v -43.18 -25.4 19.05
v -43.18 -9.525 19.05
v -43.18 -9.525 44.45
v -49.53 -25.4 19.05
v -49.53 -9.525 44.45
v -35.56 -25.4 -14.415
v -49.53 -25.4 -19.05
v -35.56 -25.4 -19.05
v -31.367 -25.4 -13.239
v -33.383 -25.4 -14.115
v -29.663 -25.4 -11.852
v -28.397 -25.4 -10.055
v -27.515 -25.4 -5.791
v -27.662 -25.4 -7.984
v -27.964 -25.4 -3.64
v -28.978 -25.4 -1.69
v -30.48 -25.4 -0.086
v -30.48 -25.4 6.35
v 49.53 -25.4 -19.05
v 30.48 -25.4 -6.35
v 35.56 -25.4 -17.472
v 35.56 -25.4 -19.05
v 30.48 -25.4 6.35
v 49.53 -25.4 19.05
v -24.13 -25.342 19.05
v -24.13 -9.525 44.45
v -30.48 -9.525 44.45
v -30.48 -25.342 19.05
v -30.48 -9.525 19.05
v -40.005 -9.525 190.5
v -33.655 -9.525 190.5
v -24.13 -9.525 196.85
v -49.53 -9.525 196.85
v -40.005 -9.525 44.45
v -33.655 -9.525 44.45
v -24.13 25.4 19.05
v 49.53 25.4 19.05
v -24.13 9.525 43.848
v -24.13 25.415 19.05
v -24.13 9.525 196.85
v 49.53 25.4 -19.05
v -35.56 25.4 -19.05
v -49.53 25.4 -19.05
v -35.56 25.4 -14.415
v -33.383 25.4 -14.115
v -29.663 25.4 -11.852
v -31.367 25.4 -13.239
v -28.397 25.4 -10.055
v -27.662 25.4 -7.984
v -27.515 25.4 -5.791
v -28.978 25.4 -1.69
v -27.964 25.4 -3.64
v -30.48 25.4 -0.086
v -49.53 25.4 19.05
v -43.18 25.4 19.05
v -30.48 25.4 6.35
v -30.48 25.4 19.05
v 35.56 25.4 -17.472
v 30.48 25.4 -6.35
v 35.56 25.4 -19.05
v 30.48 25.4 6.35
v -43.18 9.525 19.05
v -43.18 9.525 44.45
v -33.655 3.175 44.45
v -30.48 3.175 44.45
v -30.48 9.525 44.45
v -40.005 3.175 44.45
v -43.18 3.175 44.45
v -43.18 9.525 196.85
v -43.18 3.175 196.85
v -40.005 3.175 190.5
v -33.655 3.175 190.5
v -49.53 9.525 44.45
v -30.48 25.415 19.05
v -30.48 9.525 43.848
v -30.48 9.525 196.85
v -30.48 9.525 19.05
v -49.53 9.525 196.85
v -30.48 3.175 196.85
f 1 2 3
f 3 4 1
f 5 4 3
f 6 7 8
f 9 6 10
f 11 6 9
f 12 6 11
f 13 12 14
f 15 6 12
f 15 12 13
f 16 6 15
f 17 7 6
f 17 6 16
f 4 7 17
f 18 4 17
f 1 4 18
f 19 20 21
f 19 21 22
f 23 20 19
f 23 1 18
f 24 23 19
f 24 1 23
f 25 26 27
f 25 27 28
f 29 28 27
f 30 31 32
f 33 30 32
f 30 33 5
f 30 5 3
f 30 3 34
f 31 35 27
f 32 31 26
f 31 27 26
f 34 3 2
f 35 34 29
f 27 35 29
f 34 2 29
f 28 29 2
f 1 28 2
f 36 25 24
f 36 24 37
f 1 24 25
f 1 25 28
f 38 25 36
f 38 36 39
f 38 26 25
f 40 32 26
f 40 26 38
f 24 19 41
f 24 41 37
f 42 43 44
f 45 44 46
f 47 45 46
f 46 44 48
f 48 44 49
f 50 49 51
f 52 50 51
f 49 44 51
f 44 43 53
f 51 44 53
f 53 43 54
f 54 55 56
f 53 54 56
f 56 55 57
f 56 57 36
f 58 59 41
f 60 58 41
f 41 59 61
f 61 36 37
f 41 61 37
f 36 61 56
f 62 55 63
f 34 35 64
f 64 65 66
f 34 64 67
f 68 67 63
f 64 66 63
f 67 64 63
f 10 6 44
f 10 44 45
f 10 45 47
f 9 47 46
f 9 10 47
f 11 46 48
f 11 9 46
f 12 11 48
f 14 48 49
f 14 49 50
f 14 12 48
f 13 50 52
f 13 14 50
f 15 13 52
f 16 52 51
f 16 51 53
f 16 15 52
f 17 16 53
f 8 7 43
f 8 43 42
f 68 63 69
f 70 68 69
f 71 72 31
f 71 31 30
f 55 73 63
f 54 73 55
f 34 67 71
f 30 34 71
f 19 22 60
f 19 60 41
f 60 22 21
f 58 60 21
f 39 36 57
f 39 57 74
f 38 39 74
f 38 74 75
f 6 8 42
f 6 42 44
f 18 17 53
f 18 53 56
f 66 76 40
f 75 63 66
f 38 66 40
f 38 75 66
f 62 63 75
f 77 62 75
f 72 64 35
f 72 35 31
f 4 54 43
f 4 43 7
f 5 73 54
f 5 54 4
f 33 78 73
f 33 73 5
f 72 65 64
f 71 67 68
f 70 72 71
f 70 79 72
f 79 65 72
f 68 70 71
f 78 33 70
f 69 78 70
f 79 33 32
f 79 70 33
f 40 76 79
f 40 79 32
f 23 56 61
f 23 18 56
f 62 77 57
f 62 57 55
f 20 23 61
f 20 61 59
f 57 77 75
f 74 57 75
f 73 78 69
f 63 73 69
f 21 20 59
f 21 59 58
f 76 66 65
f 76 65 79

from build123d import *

# Parameters (mm, degrees)
F1_DEPTH  = 25.4
F2_W      = 71.12
F2_H      = 27.3908400369
F3_DEPTH  = 50.8
F4_R      = 8.0648205789
F5_DEPTH  = 50.8
F7_DEPTH  = 50.8
F8_W      = 25.4
F8_H      = 19.05
F9_DEPTH  = 177.8
F10_W     = 12.7
F10_H     = 177.8
F11_DEPTH = 6.35
F12_W     = 6.35
F12_H     = 146.05
F13_DEPTH = 28.576
F15_DEPTH = 6.35
F17_DEPTH = 6.35


with BuildPart() as f1:
    # F0 (on Front) → F1 (new body, symmetric)
    with BuildSketch(Plane.XZ):
        Polygon((30.48, -19.05), (49.53, -19.05), (49.53, 19.05), (-49.53, 19.05), (-49.53, -19.05), (-30.48, -19.05), (-30.48, 6.35), (30.48, 6.35), align=None)
    extrude(amount=F1_DEPTH, both=True)

    # F2 (on Front) → F3 (cut, symmetric)
    with BuildSketch(Plane.XZ):
        with Locations((0, -20.0454200185)):
            Rectangle(F2_W, F2_H)
    extrude(amount=F3_DEPTH, both=True, mode=Mode.SUBTRACT)

    # F4 (on face) → F5 (join)
    with BuildSketch(Plane.XZ.offset(25.4)):
        with Locations((-35.56, -6.35)):
            Circle(F4_R)
    extrude(amount=-F5_DEPTH)

    # F6 (on face) → F7 (join)
    with BuildSketch(Plane.XZ.offset(25.4)):
        Polygon((35.56, -17.4720194191), (35.56, -6.35), (30.48, -6.35), align=None)
    extrude(amount=-F7_DEPTH)

    # F8 (on face) → F9 (join)
    with BuildSketch(Plane.XY.offset(19.05)):
        with Locations((-36.83, 0)):
            Rectangle(F8_W, F8_H)
    extrude(amount=F9_DEPTH)

    # F10 (on face) → F11 (cut)
    with BuildSketch(Plane(origin=(0, 9.525, 0), x_dir=(-1, 0, 0), z_dir=(0, 1, 0))):
        with Locations((36.83, 133.35)):
            Rectangle(F10_W, F10_H)
    extrude(amount=-F11_DEPTH, mode=Mode.SUBTRACT)

    # F12 (on face) → F13 (cut, through all)
    with BuildSketch(Plane(origin=(0, 3.175, 0), x_dir=(-1, 0, 0), z_dir=(0, 1, 0))):
        with Locations((36.83, 117.475)):
            Rectangle(F12_W, F12_H)
    extrude(amount=-F13_DEPTH, mode=Mode.SUBTRACT)

    # F14 (on face) → F15 (join)
    with BuildSketch(Plane(origin=(-49.53, 0, 0), x_dir=(0, -1, 0), z_dir=(-1, 0, 0))):
        Polygon((-25.4, 19.05), (-9.525, 19.05), (-9.525, 44.45), align=None)
        Polygon((25.4, 19.05), (9.525, 44.45), (9.525, 19.05), align=None)
    extrude(amount=-F15_DEPTH)

    # F16 (on face) → F17 (join)
    with BuildSketch(Plane.YZ.offset(-24.13)):
        Polygon((-25.3417864442, 19.05), (-9.525, 19.05), (-9.525, 44.45), align=None)
        Polygon((9.525, 43.8476071775), (9.525, 19.05), (25.4153106362, 19.05), align=None)
    extrude(amount=-F17_DEPTH)


solid = f1.part
